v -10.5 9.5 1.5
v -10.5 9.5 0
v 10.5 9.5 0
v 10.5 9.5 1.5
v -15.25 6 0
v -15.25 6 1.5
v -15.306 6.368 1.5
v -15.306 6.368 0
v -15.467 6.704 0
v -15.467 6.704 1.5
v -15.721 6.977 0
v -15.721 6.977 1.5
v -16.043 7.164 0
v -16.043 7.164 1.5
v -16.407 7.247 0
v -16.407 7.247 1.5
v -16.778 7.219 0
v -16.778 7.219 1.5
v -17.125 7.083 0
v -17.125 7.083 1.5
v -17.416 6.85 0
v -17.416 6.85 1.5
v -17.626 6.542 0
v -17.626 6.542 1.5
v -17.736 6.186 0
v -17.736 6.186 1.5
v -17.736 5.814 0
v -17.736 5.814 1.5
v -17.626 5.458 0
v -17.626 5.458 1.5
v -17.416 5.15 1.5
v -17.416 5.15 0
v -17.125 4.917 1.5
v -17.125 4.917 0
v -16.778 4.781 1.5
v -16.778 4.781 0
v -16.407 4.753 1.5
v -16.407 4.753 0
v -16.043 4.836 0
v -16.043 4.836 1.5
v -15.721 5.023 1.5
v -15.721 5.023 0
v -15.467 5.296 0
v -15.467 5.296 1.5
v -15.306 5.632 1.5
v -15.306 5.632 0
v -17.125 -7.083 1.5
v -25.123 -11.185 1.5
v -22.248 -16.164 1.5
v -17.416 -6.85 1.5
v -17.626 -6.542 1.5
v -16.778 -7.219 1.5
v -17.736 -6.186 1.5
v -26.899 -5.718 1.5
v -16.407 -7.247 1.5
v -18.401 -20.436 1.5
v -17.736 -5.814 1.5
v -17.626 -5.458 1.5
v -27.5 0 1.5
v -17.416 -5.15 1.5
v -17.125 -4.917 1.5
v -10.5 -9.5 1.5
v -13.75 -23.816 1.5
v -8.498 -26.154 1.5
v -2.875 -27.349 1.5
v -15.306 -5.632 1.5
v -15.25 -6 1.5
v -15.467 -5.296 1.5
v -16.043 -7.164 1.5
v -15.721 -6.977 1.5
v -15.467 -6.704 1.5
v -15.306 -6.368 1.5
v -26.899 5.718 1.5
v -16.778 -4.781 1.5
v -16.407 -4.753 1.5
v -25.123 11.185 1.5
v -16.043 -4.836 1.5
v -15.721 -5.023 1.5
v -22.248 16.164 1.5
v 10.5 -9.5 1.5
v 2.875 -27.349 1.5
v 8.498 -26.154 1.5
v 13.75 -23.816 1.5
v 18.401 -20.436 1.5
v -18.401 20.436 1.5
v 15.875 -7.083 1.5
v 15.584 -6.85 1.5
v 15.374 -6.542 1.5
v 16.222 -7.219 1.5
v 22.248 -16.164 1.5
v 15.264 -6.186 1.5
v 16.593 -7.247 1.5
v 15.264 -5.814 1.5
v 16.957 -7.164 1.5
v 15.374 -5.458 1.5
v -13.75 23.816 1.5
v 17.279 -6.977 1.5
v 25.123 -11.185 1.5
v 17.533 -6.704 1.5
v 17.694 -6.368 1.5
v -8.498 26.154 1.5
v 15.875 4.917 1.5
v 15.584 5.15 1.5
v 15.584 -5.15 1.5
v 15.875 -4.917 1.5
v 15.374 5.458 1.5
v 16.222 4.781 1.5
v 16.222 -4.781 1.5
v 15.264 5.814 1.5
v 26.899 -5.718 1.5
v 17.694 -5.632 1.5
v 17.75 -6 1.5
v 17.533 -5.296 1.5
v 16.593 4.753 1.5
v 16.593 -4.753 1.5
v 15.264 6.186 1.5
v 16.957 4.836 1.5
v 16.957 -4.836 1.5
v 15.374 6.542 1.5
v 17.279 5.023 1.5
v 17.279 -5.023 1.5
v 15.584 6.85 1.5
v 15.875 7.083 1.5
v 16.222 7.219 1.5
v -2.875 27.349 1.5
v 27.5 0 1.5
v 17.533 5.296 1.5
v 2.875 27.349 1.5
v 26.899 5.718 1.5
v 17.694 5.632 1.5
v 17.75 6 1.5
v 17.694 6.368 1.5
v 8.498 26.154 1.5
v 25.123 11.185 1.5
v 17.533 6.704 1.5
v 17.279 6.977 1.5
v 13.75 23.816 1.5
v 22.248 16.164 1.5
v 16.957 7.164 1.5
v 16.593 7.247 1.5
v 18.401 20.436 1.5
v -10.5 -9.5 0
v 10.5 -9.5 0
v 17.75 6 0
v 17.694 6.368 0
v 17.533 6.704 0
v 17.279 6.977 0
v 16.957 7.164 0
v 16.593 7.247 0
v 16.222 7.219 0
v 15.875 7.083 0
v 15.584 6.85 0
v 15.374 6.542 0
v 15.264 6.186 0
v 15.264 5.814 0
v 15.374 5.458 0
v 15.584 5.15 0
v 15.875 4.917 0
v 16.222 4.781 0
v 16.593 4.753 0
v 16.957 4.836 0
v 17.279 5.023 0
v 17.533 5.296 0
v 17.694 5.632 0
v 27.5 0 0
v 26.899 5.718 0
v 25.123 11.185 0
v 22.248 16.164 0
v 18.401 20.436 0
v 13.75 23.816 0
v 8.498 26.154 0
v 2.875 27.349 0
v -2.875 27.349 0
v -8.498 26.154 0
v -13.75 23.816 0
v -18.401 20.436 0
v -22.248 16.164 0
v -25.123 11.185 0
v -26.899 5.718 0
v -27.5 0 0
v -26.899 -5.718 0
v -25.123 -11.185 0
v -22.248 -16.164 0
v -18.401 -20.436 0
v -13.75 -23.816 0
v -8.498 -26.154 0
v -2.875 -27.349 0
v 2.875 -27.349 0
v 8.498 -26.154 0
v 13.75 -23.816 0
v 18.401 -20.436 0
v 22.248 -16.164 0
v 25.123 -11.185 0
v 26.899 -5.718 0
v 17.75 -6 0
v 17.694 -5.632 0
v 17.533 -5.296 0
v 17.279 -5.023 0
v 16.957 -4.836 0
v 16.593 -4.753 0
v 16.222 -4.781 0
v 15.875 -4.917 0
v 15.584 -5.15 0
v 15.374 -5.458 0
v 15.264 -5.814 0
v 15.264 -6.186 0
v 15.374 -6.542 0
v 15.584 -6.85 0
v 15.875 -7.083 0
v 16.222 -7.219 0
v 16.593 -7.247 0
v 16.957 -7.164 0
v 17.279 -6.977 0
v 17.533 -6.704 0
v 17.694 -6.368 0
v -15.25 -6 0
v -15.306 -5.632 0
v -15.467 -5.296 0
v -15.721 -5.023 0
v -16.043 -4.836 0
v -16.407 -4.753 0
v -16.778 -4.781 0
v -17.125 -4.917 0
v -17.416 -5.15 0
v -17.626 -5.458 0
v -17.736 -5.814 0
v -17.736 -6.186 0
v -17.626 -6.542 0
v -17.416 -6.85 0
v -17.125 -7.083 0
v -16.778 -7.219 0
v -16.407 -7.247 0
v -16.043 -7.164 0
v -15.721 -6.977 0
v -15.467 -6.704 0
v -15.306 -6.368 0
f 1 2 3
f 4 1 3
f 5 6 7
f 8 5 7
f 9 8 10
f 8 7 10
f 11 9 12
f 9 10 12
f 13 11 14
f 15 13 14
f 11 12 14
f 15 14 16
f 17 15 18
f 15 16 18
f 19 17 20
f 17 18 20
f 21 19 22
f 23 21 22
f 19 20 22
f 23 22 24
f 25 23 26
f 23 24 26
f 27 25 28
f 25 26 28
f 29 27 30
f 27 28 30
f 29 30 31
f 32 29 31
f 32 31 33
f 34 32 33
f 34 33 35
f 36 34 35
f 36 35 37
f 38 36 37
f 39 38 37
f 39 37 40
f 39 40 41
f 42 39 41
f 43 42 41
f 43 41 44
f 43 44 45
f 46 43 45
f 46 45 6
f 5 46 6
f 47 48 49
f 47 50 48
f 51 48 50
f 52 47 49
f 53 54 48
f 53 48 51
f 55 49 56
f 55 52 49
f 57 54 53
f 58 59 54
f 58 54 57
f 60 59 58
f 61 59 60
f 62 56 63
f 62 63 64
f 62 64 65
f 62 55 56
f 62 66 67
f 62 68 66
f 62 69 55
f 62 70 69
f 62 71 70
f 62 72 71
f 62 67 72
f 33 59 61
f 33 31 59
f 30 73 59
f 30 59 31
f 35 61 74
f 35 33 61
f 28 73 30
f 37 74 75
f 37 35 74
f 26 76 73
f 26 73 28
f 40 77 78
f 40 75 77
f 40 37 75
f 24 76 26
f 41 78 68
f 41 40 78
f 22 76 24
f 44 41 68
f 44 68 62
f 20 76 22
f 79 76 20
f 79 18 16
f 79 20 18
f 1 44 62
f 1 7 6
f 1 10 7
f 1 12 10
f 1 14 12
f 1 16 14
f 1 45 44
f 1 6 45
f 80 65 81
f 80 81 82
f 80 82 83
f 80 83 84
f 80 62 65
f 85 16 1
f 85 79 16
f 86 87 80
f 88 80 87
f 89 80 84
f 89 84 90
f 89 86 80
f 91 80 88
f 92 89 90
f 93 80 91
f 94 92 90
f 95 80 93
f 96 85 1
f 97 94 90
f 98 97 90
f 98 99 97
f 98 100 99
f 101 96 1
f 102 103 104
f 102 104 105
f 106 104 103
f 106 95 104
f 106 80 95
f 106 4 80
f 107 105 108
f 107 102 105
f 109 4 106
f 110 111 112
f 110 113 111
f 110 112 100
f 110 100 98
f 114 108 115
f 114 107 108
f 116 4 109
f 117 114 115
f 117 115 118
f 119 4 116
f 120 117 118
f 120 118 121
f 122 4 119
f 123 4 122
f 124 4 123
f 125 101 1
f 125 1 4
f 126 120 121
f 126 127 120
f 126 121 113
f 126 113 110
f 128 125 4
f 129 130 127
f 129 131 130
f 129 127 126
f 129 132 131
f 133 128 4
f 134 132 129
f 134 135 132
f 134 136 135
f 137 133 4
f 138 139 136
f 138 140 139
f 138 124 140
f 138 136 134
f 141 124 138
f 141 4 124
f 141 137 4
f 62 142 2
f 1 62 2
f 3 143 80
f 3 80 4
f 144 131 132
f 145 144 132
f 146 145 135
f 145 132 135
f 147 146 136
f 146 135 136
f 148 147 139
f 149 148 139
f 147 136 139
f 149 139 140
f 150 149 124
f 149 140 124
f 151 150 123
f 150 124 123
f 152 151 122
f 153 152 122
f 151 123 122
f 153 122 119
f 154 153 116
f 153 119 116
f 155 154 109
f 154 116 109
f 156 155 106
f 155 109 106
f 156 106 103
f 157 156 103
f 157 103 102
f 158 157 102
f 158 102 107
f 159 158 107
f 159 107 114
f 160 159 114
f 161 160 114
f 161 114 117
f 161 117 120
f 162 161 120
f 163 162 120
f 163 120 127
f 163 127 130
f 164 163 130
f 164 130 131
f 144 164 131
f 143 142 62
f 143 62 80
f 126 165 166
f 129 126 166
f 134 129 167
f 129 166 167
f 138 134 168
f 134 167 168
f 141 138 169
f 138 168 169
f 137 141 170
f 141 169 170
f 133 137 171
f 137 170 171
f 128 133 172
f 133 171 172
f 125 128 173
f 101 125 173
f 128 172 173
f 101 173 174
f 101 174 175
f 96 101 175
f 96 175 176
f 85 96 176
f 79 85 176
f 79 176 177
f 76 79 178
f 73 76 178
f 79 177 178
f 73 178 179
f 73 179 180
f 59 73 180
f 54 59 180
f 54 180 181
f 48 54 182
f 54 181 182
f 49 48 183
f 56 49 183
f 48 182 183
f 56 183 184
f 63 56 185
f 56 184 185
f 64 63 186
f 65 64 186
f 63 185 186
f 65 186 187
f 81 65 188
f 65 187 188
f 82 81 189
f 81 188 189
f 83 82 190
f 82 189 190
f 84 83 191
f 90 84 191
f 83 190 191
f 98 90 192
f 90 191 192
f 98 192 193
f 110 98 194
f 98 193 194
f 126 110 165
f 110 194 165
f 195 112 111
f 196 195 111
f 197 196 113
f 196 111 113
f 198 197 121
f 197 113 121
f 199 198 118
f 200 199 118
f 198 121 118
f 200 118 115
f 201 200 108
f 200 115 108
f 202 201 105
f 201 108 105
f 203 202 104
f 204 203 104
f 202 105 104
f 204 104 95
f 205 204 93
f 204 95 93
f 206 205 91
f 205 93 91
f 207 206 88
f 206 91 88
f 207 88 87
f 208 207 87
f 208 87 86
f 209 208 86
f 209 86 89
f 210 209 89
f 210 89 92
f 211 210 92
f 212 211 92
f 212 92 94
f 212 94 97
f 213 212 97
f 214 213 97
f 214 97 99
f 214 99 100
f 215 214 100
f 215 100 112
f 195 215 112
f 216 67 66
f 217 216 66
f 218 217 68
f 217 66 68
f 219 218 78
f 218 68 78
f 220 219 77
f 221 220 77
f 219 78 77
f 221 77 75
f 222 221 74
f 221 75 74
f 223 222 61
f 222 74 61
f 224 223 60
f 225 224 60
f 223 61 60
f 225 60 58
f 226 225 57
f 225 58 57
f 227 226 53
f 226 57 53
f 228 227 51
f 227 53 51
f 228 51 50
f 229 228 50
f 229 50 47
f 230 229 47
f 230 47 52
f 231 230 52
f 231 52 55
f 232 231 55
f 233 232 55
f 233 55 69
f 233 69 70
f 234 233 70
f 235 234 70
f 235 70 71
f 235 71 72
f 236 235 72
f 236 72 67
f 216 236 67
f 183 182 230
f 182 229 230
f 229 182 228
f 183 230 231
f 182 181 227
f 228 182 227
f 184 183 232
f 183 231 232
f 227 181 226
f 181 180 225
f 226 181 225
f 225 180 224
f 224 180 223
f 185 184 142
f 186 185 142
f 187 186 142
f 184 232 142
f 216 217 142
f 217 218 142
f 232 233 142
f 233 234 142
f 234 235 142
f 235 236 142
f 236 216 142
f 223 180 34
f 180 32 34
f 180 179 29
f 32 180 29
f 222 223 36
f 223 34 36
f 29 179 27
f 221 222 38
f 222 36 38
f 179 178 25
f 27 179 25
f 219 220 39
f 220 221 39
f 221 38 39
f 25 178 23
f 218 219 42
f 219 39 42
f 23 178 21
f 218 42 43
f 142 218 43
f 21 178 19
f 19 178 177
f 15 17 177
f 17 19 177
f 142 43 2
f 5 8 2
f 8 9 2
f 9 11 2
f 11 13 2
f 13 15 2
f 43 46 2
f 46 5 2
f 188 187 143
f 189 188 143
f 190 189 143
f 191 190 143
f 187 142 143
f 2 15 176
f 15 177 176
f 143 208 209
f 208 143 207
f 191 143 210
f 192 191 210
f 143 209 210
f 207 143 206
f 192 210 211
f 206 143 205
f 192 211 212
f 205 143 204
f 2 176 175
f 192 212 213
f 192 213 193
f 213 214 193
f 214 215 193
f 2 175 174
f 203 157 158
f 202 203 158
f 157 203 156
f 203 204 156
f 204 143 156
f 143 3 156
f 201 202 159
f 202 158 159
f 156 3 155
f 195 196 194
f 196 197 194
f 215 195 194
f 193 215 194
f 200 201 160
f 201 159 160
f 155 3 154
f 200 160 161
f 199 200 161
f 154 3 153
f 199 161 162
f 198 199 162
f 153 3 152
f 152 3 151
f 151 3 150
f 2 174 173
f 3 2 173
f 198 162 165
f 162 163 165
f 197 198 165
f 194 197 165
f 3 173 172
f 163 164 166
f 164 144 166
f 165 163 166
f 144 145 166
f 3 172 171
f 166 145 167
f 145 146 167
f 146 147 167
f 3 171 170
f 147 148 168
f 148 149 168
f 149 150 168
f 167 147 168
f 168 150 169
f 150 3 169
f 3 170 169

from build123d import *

# Parameters (mm, degrees)
SKETCH_2_R          = 27.5
SKETCH_2_W          = 21
SKETCH_2_H          = 19
EXTRUDE_2_DEPTH     = 1.5
SKETCH_3_R          = 1.25
CUT_EXTRUDE_1_DEPTH = 10


with BuildPart() as part:
    # 草图2 → 凸台-拉伸2 (new body)
    with BuildSketch(Plane.XY):
        Circle(SKETCH_2_R)
        Rectangle(SKETCH_2_W, SKETCH_2_H, mode=Mode.SUBTRACT)
    extrude(amount=EXTRUDE_2_DEPTH)

    # 草图3 → 切除-拉伸1 (cut)
    with BuildSketch(Plane.XY.offset(1.5)):
        with Locations((16.5, 6)):
            Circle(SKETCH_3_R)
        with Locations((-16.5, 6)):
            Circle(SKETCH_3_R)
        with Locations((16.5, -6)):
            Circle(SKETCH_3_R)
        with Locations((-16.5, -6)):
            Circle(SKETCH_3_R)
    extrude(amount=-CUT_EXTRUDE_1_DEPTH, mode=Mode.SUBTRACT)


solid = part.part
